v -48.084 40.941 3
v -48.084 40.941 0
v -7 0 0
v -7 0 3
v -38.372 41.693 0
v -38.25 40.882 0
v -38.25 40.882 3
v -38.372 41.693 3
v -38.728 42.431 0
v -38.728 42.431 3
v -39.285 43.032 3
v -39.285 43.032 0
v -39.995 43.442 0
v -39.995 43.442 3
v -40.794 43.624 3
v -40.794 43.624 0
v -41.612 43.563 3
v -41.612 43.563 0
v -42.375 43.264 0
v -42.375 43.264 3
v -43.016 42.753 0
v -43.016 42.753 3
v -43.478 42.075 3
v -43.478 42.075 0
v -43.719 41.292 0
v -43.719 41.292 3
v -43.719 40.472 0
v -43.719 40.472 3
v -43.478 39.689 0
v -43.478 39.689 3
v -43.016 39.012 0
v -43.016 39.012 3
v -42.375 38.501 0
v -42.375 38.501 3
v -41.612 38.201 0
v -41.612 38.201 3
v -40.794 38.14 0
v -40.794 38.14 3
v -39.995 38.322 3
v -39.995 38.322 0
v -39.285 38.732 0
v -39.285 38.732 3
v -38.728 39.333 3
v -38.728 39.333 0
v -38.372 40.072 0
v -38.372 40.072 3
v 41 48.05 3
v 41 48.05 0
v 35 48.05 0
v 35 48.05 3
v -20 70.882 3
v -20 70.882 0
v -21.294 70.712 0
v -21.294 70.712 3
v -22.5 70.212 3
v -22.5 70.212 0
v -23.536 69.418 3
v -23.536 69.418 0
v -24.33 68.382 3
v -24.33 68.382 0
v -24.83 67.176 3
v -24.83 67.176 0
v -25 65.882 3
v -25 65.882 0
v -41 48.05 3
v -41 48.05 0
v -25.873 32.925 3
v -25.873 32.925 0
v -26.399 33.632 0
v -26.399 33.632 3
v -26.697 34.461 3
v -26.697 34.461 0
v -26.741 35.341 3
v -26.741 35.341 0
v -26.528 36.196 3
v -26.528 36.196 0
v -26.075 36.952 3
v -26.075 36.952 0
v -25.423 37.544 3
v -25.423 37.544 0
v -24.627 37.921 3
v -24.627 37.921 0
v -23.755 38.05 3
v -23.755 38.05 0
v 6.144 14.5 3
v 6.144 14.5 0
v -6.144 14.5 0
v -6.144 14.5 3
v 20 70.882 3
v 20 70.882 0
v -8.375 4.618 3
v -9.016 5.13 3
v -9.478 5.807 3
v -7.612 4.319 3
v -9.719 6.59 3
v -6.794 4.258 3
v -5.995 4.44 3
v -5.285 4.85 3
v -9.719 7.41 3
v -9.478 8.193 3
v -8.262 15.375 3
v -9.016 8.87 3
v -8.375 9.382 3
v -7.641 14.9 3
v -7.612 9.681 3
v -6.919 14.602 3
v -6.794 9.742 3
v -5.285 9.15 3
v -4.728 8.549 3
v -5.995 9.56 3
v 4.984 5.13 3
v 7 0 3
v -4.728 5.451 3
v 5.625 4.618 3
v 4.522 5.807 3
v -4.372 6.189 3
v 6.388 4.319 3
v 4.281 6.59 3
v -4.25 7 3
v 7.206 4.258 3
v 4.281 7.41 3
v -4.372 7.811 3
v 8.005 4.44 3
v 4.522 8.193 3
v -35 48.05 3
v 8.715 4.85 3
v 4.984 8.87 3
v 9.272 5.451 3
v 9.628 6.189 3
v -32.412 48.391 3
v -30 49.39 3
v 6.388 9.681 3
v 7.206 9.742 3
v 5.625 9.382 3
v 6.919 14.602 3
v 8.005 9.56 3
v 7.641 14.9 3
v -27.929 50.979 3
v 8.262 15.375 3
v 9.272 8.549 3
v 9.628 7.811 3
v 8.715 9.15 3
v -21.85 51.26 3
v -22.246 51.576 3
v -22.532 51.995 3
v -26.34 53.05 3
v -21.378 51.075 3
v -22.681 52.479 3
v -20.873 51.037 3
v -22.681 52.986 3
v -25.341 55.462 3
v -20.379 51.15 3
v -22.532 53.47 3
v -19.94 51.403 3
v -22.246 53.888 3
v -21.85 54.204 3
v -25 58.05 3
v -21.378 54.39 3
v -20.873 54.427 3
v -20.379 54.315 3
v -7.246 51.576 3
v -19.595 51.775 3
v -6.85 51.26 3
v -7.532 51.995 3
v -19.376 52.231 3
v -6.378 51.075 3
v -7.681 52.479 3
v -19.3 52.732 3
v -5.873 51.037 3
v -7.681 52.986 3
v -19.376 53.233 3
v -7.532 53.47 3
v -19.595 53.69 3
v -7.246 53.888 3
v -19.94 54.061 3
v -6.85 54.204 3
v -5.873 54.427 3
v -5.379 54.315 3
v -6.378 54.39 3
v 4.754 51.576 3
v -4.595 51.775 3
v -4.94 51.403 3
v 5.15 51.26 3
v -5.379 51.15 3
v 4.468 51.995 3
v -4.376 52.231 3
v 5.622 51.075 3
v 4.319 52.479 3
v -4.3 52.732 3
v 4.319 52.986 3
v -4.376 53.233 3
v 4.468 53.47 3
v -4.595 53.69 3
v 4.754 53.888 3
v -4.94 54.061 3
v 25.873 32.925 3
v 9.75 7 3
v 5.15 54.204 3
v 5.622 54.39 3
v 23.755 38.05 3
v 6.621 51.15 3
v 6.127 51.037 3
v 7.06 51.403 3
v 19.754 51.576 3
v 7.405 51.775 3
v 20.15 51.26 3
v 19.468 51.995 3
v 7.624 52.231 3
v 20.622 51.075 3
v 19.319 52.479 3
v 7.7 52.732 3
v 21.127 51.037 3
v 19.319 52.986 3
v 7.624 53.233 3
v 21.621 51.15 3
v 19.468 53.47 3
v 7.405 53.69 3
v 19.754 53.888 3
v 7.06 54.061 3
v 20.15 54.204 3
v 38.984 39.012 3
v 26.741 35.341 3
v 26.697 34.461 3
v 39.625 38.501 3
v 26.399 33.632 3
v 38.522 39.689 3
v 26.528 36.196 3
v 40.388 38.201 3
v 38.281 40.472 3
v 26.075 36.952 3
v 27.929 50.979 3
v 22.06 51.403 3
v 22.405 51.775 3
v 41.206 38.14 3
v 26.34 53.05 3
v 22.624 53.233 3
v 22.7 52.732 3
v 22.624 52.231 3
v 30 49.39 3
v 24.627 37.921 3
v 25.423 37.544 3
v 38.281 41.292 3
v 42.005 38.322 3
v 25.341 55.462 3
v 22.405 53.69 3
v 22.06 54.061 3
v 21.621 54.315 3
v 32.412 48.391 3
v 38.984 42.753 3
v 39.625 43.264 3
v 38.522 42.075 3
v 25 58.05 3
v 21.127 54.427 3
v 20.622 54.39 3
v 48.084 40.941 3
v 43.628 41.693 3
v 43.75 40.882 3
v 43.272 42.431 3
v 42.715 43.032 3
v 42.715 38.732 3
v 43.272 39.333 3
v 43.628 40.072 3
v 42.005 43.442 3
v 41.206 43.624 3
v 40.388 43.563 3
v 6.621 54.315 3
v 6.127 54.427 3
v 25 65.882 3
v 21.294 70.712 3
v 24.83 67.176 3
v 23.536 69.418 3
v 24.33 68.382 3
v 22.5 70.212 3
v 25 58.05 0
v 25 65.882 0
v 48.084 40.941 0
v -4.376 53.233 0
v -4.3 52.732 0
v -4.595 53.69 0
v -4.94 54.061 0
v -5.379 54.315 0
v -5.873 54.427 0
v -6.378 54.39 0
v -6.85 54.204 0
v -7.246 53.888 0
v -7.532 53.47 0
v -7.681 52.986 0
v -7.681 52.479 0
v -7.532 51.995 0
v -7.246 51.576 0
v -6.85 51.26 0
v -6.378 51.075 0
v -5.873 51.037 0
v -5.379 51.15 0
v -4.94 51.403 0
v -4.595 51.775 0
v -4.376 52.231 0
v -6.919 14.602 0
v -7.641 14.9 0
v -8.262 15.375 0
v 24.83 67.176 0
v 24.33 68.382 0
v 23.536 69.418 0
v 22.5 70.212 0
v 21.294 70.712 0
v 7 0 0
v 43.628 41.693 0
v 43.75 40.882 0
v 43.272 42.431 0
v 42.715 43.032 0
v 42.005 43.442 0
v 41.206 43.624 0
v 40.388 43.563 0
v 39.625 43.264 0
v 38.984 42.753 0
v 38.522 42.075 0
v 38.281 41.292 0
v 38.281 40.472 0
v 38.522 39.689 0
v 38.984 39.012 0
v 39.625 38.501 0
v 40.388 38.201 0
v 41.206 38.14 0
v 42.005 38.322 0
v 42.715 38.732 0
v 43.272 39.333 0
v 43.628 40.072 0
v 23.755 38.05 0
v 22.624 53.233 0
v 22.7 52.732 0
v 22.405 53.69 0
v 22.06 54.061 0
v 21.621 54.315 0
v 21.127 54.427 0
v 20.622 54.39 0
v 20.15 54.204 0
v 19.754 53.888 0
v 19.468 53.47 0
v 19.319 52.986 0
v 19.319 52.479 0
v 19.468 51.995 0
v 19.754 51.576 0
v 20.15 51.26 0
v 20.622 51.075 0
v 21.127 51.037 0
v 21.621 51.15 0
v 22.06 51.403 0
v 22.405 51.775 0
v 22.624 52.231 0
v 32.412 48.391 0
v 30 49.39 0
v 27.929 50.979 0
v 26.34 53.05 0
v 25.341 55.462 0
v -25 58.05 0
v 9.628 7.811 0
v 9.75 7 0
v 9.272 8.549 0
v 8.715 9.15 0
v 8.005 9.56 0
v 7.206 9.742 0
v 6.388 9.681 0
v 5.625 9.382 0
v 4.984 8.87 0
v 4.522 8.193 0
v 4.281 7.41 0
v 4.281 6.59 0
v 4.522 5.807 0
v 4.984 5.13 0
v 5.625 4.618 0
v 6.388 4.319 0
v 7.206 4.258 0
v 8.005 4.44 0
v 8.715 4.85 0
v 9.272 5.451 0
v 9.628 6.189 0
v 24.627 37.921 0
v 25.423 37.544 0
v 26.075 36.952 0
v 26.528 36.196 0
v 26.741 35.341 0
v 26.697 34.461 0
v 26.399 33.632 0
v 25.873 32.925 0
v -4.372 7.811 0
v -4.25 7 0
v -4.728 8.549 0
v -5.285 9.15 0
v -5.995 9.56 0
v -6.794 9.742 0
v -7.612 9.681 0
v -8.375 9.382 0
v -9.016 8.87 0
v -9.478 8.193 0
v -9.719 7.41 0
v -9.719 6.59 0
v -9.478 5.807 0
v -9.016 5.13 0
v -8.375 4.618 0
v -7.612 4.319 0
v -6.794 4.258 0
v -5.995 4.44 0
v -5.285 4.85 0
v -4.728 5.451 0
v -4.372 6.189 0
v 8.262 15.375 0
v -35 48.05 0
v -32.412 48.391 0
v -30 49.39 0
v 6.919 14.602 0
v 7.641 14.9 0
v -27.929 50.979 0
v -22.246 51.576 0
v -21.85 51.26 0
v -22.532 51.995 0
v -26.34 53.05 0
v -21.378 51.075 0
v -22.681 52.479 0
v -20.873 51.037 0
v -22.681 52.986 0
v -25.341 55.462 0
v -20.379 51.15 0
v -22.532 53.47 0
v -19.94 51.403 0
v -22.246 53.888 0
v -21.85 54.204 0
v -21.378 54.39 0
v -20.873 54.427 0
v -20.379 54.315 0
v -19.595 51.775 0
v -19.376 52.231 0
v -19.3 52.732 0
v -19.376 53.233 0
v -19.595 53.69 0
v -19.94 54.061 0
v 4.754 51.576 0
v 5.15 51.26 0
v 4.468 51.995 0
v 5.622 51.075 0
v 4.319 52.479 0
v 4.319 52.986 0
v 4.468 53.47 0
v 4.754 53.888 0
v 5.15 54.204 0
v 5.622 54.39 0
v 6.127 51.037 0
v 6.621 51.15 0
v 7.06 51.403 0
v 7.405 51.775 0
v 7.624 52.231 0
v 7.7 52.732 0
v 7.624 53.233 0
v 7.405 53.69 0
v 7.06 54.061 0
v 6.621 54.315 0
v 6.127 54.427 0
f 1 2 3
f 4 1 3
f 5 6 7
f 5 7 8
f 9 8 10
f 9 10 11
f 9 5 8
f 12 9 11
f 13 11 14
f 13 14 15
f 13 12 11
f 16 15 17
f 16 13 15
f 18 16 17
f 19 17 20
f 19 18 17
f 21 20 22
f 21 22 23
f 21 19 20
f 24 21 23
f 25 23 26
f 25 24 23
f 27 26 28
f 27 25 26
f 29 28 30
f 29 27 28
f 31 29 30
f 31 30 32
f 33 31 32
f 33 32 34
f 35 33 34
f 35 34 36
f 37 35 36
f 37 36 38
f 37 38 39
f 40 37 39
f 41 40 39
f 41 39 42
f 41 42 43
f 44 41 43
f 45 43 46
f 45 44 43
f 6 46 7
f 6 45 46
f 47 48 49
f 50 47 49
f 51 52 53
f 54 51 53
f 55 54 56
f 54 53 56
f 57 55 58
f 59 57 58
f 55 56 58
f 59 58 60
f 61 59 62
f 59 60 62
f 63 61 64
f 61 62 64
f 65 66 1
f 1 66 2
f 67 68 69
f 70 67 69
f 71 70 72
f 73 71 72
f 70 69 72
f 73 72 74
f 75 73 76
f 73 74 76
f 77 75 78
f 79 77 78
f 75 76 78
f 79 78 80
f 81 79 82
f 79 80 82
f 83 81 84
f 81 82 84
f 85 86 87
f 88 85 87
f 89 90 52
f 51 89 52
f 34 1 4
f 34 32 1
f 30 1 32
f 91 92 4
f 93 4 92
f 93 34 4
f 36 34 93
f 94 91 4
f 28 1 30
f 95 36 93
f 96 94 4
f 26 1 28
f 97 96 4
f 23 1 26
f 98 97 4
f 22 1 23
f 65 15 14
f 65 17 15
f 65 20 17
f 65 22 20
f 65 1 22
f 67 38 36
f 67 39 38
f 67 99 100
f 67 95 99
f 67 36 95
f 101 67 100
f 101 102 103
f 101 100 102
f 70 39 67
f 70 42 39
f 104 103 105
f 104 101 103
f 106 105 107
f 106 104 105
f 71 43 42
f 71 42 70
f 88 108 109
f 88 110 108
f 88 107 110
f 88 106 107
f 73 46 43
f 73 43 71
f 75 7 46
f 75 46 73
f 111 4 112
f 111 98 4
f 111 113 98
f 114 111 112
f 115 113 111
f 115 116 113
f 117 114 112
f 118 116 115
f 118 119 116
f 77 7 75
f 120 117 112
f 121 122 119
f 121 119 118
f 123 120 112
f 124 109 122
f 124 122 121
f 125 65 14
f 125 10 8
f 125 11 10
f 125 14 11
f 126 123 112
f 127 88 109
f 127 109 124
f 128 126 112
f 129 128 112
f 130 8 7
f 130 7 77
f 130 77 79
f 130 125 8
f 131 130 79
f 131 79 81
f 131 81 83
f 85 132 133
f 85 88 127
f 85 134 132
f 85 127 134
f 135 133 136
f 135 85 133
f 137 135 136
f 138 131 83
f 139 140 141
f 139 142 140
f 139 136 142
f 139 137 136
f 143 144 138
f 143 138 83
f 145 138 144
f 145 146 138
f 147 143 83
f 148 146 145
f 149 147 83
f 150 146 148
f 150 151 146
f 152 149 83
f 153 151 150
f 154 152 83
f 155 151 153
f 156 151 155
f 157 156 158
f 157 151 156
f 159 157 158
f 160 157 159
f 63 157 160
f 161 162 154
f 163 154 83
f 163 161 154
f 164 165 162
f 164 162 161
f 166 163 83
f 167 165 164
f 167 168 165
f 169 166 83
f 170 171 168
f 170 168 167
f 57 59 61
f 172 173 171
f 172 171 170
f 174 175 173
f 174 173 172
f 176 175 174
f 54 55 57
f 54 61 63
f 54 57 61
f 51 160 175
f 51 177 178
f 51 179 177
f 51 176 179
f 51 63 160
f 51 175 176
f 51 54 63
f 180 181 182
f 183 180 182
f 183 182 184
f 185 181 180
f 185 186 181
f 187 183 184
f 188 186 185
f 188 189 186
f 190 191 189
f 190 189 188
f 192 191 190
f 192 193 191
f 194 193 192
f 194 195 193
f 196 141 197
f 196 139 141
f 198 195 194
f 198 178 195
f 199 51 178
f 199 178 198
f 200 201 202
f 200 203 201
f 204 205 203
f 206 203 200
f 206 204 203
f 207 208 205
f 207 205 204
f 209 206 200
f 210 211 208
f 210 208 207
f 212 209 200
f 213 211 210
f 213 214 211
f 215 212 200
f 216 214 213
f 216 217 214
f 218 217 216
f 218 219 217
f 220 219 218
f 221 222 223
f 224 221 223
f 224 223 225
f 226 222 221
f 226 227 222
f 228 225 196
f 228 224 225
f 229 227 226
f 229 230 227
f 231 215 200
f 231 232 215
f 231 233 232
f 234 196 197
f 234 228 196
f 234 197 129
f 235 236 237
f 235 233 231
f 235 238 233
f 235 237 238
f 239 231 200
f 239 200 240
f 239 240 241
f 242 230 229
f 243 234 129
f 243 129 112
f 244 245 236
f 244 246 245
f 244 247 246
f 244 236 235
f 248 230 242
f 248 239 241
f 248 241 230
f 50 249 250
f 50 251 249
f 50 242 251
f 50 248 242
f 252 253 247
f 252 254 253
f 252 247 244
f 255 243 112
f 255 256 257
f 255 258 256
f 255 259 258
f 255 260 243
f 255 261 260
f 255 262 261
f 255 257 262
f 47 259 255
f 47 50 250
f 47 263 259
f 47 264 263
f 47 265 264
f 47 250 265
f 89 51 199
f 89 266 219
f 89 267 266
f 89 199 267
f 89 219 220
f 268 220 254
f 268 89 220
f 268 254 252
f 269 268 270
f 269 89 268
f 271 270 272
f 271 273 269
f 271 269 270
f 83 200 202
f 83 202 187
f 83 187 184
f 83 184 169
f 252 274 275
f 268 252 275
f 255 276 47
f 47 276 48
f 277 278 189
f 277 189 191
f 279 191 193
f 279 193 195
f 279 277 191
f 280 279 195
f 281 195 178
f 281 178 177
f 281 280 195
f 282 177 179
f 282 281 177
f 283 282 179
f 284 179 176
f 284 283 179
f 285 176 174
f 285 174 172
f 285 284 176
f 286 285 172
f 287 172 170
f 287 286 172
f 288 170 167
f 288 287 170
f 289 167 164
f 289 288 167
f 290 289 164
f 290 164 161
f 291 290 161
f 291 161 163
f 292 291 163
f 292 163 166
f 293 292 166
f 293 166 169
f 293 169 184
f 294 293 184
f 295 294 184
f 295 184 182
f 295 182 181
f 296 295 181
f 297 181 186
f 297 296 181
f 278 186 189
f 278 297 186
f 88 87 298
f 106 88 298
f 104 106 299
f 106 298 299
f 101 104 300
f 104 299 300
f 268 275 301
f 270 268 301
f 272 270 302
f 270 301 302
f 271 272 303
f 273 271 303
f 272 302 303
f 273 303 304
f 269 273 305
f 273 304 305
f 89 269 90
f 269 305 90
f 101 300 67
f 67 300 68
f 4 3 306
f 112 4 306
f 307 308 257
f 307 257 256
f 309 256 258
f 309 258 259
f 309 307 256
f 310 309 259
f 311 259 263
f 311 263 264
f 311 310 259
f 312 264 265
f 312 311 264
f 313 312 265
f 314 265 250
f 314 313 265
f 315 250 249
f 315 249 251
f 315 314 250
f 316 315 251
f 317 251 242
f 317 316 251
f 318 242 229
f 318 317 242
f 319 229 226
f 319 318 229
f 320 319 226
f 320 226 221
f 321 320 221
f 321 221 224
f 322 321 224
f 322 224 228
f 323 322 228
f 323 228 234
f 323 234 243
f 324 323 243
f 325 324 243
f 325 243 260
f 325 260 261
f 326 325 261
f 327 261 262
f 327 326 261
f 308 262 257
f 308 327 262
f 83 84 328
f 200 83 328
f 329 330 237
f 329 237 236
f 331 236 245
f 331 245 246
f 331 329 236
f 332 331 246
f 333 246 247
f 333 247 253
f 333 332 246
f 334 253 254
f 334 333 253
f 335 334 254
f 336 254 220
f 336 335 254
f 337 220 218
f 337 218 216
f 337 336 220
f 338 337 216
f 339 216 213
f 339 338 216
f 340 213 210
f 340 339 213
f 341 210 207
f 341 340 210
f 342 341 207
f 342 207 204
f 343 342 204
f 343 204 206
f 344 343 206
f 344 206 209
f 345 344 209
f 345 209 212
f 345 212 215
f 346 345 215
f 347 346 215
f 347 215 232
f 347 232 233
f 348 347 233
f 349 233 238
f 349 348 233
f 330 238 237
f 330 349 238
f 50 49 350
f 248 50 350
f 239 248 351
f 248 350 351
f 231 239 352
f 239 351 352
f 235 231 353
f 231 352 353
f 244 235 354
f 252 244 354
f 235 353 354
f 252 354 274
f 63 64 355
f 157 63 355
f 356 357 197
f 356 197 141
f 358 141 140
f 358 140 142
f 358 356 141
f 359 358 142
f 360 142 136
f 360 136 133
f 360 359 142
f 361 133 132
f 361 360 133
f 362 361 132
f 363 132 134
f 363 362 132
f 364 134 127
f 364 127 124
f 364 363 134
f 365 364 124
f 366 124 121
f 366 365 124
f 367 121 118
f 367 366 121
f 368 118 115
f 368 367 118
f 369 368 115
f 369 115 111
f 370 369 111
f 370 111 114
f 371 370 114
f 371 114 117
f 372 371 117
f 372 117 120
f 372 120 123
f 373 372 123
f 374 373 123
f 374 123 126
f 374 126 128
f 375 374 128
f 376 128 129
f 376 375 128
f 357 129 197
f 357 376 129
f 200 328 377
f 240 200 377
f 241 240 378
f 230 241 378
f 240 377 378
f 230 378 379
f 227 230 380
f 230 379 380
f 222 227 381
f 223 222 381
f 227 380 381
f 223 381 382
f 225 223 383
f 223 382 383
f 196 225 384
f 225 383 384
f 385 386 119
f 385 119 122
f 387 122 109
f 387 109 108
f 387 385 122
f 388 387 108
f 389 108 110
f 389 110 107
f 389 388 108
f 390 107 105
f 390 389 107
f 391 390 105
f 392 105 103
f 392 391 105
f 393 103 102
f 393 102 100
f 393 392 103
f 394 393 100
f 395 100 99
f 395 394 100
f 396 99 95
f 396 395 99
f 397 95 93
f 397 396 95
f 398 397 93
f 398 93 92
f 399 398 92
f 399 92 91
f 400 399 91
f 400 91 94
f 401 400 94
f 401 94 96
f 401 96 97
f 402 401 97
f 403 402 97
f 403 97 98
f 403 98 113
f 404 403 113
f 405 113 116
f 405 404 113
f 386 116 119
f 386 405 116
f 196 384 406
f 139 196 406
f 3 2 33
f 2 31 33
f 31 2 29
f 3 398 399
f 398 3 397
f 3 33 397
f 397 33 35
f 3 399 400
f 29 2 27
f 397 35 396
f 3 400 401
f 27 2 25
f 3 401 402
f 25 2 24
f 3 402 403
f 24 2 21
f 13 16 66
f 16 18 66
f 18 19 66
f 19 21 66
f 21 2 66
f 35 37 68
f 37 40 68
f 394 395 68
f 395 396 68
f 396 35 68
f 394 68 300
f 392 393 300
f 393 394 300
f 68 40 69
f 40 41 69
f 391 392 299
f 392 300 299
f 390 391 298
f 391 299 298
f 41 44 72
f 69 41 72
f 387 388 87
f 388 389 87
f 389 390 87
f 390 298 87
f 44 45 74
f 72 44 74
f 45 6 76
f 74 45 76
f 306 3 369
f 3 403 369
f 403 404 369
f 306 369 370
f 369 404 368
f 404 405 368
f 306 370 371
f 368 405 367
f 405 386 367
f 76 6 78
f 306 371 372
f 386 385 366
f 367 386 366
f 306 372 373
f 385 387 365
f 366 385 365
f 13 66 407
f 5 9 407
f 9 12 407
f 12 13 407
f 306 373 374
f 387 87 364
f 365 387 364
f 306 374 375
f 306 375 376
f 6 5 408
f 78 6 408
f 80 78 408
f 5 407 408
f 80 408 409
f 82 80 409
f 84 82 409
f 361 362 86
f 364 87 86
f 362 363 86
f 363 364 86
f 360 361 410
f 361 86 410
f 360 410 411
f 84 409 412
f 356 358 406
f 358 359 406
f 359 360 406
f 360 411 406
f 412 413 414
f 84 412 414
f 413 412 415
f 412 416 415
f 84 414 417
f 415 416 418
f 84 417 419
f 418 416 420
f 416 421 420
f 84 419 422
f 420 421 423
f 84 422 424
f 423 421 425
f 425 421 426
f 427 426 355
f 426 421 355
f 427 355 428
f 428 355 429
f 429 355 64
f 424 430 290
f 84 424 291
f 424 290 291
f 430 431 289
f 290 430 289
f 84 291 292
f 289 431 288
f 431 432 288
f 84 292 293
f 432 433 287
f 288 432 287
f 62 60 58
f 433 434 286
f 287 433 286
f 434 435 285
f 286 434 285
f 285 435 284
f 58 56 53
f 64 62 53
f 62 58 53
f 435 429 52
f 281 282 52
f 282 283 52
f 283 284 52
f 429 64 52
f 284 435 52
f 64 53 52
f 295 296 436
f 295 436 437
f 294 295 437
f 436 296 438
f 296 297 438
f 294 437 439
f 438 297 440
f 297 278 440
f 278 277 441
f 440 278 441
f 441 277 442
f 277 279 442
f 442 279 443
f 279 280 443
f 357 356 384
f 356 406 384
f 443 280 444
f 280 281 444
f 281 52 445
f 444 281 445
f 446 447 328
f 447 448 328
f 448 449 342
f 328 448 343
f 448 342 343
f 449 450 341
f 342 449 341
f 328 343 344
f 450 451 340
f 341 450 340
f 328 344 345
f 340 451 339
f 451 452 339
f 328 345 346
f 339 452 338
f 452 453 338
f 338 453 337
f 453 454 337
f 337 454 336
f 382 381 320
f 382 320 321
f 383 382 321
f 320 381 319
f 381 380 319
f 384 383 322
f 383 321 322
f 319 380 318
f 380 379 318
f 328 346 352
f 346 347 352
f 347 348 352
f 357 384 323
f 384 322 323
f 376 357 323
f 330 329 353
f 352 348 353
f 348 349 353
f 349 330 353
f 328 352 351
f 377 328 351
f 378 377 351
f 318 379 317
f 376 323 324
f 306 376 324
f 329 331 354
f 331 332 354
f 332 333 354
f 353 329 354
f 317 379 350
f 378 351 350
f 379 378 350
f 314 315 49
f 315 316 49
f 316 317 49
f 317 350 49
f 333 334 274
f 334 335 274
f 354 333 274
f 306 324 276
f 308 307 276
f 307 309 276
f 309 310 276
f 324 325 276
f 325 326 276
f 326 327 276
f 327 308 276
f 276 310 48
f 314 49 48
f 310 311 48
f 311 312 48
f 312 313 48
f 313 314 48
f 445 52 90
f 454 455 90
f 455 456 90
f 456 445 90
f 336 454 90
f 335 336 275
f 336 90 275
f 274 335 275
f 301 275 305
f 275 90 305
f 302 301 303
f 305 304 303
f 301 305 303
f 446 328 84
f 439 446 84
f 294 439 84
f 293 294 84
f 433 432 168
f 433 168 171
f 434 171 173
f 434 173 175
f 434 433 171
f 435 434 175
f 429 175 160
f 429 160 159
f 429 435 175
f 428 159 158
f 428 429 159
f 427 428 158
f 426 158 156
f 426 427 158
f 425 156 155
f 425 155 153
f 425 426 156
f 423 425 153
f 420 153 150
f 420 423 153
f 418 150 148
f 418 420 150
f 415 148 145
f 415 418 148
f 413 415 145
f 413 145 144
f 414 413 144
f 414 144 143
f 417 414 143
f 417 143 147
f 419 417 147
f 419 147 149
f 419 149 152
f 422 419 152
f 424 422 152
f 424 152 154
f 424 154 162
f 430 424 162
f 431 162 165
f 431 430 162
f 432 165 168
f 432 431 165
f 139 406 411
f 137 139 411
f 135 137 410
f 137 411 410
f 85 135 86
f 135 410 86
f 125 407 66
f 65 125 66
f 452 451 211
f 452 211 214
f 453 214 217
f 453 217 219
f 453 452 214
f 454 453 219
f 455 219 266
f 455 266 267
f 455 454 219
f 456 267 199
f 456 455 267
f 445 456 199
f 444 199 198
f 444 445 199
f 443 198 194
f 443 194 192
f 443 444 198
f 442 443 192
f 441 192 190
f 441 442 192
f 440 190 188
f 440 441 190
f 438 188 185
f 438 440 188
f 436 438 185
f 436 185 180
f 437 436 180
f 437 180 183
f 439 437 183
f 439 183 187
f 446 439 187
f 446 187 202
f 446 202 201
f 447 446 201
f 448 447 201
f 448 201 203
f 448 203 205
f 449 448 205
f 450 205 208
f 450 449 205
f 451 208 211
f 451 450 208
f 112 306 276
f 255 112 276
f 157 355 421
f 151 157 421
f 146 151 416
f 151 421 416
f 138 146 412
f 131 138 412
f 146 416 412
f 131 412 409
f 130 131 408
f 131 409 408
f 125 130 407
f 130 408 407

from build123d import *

# Parameters (mm, degrees)
F1_R     = 2.75
F1_R_2   = 1.7
F2_DEPTH = 3


with BuildPart() as f2:
    # F1 (on Top) → F2 (new body)
    with BuildSketch(Plane.XY):
        with BuildLine():
            Line((0, 0), (7, 0))
            Line((7, 0), (48.083883, 40.941477))
            Line((48.083883, 40.941477), (41, 48.05))
            Line((41, 48.05), (35, 48.05))
            ThreePointArc((35, 48.05), (27.928932, 50.978932), (25, 58.05))
            Line((25, 58.05), (25, 65.882149))
            ThreePointArc((25, 65.882149), (23.535534, 69.417683), (20, 70.882149))
            Line((20, 70.882149), (0, 70.882149))
            Line((0, 70.882149), (-20, 70.882149))
            ThreePointArc((-20, 70.882149), (-23.535534, 69.417683), (-25, 65.882149))
            Line((-25, 65.882149), (-25, 58.05))
            ThreePointArc((-25, 58.05), (-27.928932, 50.978932), (-35, 48.05))
            Line((-35, 48.05), (-41, 48.05))
            Line((-41, 48.05), (-48.083883, 40.941477))
            Line((-48.083883, 40.941477), (-7, 0))
            Line((-7, 0), (0, 0))
        make_face()
        with Locations((-7, 7)):
            Circle(F1_R, mode=Mode.SUBTRACT)
        with Locations((7, 7)):
            Circle(F1_R, mode=Mode.SUBTRACT)
        with BuildLine():
            Line((6.144092, 14.5), (0, 14.5))
            Line((0, 14.5), (-6.144092, 14.5))
            ThreePointArc((-6.144092, 14.5), (-7.289736, 14.727366), (-8.261726, 15.375))
            Line((-8.261726, 15.375), (-25.87277, 32.925))
            ThreePointArc((-25.87277, 32.925), (-26.52777, 36.195644), (-23.755136, 38.05))
            Line((-23.755136, 38.05), (0, 38.05))
            Line((0, 38.05), (23.755136, 38.05))
            ThreePointArc((23.755136, 38.05), (26.52777, 36.195644), (25.87277, 32.925))
            Line((25.87277, 32.925), (8.261726, 15.375))
            ThreePointArc((8.261726, 15.375), (7.289736, 14.727366), (6.144092, 14.5))
        make_face(mode=Mode.SUBTRACT)
        with Locations((-41, 40.882149)):
            Circle(F1_R, mode=Mode.SUBTRACT)
        with Locations((-21, 52.732149)):
            Circle(F1_R_2, mode=Mode.SUBTRACT)
        with Locations((-6, 52.732149)):
            Circle(F1_R_2, mode=Mode.SUBTRACT)
        with Locations((6, 52.732149)):
            Circle(F1_R_2, mode=Mode.SUBTRACT)
        with Locations((21, 52.732149)):
            Circle(F1_R_2, mode=Mode.SUBTRACT)
        with Locations((41, 40.882149)):
            Circle(F1_R, mode=Mode.SUBTRACT)
    extrude(amount=F2_DEPTH)


solid = f2.part
